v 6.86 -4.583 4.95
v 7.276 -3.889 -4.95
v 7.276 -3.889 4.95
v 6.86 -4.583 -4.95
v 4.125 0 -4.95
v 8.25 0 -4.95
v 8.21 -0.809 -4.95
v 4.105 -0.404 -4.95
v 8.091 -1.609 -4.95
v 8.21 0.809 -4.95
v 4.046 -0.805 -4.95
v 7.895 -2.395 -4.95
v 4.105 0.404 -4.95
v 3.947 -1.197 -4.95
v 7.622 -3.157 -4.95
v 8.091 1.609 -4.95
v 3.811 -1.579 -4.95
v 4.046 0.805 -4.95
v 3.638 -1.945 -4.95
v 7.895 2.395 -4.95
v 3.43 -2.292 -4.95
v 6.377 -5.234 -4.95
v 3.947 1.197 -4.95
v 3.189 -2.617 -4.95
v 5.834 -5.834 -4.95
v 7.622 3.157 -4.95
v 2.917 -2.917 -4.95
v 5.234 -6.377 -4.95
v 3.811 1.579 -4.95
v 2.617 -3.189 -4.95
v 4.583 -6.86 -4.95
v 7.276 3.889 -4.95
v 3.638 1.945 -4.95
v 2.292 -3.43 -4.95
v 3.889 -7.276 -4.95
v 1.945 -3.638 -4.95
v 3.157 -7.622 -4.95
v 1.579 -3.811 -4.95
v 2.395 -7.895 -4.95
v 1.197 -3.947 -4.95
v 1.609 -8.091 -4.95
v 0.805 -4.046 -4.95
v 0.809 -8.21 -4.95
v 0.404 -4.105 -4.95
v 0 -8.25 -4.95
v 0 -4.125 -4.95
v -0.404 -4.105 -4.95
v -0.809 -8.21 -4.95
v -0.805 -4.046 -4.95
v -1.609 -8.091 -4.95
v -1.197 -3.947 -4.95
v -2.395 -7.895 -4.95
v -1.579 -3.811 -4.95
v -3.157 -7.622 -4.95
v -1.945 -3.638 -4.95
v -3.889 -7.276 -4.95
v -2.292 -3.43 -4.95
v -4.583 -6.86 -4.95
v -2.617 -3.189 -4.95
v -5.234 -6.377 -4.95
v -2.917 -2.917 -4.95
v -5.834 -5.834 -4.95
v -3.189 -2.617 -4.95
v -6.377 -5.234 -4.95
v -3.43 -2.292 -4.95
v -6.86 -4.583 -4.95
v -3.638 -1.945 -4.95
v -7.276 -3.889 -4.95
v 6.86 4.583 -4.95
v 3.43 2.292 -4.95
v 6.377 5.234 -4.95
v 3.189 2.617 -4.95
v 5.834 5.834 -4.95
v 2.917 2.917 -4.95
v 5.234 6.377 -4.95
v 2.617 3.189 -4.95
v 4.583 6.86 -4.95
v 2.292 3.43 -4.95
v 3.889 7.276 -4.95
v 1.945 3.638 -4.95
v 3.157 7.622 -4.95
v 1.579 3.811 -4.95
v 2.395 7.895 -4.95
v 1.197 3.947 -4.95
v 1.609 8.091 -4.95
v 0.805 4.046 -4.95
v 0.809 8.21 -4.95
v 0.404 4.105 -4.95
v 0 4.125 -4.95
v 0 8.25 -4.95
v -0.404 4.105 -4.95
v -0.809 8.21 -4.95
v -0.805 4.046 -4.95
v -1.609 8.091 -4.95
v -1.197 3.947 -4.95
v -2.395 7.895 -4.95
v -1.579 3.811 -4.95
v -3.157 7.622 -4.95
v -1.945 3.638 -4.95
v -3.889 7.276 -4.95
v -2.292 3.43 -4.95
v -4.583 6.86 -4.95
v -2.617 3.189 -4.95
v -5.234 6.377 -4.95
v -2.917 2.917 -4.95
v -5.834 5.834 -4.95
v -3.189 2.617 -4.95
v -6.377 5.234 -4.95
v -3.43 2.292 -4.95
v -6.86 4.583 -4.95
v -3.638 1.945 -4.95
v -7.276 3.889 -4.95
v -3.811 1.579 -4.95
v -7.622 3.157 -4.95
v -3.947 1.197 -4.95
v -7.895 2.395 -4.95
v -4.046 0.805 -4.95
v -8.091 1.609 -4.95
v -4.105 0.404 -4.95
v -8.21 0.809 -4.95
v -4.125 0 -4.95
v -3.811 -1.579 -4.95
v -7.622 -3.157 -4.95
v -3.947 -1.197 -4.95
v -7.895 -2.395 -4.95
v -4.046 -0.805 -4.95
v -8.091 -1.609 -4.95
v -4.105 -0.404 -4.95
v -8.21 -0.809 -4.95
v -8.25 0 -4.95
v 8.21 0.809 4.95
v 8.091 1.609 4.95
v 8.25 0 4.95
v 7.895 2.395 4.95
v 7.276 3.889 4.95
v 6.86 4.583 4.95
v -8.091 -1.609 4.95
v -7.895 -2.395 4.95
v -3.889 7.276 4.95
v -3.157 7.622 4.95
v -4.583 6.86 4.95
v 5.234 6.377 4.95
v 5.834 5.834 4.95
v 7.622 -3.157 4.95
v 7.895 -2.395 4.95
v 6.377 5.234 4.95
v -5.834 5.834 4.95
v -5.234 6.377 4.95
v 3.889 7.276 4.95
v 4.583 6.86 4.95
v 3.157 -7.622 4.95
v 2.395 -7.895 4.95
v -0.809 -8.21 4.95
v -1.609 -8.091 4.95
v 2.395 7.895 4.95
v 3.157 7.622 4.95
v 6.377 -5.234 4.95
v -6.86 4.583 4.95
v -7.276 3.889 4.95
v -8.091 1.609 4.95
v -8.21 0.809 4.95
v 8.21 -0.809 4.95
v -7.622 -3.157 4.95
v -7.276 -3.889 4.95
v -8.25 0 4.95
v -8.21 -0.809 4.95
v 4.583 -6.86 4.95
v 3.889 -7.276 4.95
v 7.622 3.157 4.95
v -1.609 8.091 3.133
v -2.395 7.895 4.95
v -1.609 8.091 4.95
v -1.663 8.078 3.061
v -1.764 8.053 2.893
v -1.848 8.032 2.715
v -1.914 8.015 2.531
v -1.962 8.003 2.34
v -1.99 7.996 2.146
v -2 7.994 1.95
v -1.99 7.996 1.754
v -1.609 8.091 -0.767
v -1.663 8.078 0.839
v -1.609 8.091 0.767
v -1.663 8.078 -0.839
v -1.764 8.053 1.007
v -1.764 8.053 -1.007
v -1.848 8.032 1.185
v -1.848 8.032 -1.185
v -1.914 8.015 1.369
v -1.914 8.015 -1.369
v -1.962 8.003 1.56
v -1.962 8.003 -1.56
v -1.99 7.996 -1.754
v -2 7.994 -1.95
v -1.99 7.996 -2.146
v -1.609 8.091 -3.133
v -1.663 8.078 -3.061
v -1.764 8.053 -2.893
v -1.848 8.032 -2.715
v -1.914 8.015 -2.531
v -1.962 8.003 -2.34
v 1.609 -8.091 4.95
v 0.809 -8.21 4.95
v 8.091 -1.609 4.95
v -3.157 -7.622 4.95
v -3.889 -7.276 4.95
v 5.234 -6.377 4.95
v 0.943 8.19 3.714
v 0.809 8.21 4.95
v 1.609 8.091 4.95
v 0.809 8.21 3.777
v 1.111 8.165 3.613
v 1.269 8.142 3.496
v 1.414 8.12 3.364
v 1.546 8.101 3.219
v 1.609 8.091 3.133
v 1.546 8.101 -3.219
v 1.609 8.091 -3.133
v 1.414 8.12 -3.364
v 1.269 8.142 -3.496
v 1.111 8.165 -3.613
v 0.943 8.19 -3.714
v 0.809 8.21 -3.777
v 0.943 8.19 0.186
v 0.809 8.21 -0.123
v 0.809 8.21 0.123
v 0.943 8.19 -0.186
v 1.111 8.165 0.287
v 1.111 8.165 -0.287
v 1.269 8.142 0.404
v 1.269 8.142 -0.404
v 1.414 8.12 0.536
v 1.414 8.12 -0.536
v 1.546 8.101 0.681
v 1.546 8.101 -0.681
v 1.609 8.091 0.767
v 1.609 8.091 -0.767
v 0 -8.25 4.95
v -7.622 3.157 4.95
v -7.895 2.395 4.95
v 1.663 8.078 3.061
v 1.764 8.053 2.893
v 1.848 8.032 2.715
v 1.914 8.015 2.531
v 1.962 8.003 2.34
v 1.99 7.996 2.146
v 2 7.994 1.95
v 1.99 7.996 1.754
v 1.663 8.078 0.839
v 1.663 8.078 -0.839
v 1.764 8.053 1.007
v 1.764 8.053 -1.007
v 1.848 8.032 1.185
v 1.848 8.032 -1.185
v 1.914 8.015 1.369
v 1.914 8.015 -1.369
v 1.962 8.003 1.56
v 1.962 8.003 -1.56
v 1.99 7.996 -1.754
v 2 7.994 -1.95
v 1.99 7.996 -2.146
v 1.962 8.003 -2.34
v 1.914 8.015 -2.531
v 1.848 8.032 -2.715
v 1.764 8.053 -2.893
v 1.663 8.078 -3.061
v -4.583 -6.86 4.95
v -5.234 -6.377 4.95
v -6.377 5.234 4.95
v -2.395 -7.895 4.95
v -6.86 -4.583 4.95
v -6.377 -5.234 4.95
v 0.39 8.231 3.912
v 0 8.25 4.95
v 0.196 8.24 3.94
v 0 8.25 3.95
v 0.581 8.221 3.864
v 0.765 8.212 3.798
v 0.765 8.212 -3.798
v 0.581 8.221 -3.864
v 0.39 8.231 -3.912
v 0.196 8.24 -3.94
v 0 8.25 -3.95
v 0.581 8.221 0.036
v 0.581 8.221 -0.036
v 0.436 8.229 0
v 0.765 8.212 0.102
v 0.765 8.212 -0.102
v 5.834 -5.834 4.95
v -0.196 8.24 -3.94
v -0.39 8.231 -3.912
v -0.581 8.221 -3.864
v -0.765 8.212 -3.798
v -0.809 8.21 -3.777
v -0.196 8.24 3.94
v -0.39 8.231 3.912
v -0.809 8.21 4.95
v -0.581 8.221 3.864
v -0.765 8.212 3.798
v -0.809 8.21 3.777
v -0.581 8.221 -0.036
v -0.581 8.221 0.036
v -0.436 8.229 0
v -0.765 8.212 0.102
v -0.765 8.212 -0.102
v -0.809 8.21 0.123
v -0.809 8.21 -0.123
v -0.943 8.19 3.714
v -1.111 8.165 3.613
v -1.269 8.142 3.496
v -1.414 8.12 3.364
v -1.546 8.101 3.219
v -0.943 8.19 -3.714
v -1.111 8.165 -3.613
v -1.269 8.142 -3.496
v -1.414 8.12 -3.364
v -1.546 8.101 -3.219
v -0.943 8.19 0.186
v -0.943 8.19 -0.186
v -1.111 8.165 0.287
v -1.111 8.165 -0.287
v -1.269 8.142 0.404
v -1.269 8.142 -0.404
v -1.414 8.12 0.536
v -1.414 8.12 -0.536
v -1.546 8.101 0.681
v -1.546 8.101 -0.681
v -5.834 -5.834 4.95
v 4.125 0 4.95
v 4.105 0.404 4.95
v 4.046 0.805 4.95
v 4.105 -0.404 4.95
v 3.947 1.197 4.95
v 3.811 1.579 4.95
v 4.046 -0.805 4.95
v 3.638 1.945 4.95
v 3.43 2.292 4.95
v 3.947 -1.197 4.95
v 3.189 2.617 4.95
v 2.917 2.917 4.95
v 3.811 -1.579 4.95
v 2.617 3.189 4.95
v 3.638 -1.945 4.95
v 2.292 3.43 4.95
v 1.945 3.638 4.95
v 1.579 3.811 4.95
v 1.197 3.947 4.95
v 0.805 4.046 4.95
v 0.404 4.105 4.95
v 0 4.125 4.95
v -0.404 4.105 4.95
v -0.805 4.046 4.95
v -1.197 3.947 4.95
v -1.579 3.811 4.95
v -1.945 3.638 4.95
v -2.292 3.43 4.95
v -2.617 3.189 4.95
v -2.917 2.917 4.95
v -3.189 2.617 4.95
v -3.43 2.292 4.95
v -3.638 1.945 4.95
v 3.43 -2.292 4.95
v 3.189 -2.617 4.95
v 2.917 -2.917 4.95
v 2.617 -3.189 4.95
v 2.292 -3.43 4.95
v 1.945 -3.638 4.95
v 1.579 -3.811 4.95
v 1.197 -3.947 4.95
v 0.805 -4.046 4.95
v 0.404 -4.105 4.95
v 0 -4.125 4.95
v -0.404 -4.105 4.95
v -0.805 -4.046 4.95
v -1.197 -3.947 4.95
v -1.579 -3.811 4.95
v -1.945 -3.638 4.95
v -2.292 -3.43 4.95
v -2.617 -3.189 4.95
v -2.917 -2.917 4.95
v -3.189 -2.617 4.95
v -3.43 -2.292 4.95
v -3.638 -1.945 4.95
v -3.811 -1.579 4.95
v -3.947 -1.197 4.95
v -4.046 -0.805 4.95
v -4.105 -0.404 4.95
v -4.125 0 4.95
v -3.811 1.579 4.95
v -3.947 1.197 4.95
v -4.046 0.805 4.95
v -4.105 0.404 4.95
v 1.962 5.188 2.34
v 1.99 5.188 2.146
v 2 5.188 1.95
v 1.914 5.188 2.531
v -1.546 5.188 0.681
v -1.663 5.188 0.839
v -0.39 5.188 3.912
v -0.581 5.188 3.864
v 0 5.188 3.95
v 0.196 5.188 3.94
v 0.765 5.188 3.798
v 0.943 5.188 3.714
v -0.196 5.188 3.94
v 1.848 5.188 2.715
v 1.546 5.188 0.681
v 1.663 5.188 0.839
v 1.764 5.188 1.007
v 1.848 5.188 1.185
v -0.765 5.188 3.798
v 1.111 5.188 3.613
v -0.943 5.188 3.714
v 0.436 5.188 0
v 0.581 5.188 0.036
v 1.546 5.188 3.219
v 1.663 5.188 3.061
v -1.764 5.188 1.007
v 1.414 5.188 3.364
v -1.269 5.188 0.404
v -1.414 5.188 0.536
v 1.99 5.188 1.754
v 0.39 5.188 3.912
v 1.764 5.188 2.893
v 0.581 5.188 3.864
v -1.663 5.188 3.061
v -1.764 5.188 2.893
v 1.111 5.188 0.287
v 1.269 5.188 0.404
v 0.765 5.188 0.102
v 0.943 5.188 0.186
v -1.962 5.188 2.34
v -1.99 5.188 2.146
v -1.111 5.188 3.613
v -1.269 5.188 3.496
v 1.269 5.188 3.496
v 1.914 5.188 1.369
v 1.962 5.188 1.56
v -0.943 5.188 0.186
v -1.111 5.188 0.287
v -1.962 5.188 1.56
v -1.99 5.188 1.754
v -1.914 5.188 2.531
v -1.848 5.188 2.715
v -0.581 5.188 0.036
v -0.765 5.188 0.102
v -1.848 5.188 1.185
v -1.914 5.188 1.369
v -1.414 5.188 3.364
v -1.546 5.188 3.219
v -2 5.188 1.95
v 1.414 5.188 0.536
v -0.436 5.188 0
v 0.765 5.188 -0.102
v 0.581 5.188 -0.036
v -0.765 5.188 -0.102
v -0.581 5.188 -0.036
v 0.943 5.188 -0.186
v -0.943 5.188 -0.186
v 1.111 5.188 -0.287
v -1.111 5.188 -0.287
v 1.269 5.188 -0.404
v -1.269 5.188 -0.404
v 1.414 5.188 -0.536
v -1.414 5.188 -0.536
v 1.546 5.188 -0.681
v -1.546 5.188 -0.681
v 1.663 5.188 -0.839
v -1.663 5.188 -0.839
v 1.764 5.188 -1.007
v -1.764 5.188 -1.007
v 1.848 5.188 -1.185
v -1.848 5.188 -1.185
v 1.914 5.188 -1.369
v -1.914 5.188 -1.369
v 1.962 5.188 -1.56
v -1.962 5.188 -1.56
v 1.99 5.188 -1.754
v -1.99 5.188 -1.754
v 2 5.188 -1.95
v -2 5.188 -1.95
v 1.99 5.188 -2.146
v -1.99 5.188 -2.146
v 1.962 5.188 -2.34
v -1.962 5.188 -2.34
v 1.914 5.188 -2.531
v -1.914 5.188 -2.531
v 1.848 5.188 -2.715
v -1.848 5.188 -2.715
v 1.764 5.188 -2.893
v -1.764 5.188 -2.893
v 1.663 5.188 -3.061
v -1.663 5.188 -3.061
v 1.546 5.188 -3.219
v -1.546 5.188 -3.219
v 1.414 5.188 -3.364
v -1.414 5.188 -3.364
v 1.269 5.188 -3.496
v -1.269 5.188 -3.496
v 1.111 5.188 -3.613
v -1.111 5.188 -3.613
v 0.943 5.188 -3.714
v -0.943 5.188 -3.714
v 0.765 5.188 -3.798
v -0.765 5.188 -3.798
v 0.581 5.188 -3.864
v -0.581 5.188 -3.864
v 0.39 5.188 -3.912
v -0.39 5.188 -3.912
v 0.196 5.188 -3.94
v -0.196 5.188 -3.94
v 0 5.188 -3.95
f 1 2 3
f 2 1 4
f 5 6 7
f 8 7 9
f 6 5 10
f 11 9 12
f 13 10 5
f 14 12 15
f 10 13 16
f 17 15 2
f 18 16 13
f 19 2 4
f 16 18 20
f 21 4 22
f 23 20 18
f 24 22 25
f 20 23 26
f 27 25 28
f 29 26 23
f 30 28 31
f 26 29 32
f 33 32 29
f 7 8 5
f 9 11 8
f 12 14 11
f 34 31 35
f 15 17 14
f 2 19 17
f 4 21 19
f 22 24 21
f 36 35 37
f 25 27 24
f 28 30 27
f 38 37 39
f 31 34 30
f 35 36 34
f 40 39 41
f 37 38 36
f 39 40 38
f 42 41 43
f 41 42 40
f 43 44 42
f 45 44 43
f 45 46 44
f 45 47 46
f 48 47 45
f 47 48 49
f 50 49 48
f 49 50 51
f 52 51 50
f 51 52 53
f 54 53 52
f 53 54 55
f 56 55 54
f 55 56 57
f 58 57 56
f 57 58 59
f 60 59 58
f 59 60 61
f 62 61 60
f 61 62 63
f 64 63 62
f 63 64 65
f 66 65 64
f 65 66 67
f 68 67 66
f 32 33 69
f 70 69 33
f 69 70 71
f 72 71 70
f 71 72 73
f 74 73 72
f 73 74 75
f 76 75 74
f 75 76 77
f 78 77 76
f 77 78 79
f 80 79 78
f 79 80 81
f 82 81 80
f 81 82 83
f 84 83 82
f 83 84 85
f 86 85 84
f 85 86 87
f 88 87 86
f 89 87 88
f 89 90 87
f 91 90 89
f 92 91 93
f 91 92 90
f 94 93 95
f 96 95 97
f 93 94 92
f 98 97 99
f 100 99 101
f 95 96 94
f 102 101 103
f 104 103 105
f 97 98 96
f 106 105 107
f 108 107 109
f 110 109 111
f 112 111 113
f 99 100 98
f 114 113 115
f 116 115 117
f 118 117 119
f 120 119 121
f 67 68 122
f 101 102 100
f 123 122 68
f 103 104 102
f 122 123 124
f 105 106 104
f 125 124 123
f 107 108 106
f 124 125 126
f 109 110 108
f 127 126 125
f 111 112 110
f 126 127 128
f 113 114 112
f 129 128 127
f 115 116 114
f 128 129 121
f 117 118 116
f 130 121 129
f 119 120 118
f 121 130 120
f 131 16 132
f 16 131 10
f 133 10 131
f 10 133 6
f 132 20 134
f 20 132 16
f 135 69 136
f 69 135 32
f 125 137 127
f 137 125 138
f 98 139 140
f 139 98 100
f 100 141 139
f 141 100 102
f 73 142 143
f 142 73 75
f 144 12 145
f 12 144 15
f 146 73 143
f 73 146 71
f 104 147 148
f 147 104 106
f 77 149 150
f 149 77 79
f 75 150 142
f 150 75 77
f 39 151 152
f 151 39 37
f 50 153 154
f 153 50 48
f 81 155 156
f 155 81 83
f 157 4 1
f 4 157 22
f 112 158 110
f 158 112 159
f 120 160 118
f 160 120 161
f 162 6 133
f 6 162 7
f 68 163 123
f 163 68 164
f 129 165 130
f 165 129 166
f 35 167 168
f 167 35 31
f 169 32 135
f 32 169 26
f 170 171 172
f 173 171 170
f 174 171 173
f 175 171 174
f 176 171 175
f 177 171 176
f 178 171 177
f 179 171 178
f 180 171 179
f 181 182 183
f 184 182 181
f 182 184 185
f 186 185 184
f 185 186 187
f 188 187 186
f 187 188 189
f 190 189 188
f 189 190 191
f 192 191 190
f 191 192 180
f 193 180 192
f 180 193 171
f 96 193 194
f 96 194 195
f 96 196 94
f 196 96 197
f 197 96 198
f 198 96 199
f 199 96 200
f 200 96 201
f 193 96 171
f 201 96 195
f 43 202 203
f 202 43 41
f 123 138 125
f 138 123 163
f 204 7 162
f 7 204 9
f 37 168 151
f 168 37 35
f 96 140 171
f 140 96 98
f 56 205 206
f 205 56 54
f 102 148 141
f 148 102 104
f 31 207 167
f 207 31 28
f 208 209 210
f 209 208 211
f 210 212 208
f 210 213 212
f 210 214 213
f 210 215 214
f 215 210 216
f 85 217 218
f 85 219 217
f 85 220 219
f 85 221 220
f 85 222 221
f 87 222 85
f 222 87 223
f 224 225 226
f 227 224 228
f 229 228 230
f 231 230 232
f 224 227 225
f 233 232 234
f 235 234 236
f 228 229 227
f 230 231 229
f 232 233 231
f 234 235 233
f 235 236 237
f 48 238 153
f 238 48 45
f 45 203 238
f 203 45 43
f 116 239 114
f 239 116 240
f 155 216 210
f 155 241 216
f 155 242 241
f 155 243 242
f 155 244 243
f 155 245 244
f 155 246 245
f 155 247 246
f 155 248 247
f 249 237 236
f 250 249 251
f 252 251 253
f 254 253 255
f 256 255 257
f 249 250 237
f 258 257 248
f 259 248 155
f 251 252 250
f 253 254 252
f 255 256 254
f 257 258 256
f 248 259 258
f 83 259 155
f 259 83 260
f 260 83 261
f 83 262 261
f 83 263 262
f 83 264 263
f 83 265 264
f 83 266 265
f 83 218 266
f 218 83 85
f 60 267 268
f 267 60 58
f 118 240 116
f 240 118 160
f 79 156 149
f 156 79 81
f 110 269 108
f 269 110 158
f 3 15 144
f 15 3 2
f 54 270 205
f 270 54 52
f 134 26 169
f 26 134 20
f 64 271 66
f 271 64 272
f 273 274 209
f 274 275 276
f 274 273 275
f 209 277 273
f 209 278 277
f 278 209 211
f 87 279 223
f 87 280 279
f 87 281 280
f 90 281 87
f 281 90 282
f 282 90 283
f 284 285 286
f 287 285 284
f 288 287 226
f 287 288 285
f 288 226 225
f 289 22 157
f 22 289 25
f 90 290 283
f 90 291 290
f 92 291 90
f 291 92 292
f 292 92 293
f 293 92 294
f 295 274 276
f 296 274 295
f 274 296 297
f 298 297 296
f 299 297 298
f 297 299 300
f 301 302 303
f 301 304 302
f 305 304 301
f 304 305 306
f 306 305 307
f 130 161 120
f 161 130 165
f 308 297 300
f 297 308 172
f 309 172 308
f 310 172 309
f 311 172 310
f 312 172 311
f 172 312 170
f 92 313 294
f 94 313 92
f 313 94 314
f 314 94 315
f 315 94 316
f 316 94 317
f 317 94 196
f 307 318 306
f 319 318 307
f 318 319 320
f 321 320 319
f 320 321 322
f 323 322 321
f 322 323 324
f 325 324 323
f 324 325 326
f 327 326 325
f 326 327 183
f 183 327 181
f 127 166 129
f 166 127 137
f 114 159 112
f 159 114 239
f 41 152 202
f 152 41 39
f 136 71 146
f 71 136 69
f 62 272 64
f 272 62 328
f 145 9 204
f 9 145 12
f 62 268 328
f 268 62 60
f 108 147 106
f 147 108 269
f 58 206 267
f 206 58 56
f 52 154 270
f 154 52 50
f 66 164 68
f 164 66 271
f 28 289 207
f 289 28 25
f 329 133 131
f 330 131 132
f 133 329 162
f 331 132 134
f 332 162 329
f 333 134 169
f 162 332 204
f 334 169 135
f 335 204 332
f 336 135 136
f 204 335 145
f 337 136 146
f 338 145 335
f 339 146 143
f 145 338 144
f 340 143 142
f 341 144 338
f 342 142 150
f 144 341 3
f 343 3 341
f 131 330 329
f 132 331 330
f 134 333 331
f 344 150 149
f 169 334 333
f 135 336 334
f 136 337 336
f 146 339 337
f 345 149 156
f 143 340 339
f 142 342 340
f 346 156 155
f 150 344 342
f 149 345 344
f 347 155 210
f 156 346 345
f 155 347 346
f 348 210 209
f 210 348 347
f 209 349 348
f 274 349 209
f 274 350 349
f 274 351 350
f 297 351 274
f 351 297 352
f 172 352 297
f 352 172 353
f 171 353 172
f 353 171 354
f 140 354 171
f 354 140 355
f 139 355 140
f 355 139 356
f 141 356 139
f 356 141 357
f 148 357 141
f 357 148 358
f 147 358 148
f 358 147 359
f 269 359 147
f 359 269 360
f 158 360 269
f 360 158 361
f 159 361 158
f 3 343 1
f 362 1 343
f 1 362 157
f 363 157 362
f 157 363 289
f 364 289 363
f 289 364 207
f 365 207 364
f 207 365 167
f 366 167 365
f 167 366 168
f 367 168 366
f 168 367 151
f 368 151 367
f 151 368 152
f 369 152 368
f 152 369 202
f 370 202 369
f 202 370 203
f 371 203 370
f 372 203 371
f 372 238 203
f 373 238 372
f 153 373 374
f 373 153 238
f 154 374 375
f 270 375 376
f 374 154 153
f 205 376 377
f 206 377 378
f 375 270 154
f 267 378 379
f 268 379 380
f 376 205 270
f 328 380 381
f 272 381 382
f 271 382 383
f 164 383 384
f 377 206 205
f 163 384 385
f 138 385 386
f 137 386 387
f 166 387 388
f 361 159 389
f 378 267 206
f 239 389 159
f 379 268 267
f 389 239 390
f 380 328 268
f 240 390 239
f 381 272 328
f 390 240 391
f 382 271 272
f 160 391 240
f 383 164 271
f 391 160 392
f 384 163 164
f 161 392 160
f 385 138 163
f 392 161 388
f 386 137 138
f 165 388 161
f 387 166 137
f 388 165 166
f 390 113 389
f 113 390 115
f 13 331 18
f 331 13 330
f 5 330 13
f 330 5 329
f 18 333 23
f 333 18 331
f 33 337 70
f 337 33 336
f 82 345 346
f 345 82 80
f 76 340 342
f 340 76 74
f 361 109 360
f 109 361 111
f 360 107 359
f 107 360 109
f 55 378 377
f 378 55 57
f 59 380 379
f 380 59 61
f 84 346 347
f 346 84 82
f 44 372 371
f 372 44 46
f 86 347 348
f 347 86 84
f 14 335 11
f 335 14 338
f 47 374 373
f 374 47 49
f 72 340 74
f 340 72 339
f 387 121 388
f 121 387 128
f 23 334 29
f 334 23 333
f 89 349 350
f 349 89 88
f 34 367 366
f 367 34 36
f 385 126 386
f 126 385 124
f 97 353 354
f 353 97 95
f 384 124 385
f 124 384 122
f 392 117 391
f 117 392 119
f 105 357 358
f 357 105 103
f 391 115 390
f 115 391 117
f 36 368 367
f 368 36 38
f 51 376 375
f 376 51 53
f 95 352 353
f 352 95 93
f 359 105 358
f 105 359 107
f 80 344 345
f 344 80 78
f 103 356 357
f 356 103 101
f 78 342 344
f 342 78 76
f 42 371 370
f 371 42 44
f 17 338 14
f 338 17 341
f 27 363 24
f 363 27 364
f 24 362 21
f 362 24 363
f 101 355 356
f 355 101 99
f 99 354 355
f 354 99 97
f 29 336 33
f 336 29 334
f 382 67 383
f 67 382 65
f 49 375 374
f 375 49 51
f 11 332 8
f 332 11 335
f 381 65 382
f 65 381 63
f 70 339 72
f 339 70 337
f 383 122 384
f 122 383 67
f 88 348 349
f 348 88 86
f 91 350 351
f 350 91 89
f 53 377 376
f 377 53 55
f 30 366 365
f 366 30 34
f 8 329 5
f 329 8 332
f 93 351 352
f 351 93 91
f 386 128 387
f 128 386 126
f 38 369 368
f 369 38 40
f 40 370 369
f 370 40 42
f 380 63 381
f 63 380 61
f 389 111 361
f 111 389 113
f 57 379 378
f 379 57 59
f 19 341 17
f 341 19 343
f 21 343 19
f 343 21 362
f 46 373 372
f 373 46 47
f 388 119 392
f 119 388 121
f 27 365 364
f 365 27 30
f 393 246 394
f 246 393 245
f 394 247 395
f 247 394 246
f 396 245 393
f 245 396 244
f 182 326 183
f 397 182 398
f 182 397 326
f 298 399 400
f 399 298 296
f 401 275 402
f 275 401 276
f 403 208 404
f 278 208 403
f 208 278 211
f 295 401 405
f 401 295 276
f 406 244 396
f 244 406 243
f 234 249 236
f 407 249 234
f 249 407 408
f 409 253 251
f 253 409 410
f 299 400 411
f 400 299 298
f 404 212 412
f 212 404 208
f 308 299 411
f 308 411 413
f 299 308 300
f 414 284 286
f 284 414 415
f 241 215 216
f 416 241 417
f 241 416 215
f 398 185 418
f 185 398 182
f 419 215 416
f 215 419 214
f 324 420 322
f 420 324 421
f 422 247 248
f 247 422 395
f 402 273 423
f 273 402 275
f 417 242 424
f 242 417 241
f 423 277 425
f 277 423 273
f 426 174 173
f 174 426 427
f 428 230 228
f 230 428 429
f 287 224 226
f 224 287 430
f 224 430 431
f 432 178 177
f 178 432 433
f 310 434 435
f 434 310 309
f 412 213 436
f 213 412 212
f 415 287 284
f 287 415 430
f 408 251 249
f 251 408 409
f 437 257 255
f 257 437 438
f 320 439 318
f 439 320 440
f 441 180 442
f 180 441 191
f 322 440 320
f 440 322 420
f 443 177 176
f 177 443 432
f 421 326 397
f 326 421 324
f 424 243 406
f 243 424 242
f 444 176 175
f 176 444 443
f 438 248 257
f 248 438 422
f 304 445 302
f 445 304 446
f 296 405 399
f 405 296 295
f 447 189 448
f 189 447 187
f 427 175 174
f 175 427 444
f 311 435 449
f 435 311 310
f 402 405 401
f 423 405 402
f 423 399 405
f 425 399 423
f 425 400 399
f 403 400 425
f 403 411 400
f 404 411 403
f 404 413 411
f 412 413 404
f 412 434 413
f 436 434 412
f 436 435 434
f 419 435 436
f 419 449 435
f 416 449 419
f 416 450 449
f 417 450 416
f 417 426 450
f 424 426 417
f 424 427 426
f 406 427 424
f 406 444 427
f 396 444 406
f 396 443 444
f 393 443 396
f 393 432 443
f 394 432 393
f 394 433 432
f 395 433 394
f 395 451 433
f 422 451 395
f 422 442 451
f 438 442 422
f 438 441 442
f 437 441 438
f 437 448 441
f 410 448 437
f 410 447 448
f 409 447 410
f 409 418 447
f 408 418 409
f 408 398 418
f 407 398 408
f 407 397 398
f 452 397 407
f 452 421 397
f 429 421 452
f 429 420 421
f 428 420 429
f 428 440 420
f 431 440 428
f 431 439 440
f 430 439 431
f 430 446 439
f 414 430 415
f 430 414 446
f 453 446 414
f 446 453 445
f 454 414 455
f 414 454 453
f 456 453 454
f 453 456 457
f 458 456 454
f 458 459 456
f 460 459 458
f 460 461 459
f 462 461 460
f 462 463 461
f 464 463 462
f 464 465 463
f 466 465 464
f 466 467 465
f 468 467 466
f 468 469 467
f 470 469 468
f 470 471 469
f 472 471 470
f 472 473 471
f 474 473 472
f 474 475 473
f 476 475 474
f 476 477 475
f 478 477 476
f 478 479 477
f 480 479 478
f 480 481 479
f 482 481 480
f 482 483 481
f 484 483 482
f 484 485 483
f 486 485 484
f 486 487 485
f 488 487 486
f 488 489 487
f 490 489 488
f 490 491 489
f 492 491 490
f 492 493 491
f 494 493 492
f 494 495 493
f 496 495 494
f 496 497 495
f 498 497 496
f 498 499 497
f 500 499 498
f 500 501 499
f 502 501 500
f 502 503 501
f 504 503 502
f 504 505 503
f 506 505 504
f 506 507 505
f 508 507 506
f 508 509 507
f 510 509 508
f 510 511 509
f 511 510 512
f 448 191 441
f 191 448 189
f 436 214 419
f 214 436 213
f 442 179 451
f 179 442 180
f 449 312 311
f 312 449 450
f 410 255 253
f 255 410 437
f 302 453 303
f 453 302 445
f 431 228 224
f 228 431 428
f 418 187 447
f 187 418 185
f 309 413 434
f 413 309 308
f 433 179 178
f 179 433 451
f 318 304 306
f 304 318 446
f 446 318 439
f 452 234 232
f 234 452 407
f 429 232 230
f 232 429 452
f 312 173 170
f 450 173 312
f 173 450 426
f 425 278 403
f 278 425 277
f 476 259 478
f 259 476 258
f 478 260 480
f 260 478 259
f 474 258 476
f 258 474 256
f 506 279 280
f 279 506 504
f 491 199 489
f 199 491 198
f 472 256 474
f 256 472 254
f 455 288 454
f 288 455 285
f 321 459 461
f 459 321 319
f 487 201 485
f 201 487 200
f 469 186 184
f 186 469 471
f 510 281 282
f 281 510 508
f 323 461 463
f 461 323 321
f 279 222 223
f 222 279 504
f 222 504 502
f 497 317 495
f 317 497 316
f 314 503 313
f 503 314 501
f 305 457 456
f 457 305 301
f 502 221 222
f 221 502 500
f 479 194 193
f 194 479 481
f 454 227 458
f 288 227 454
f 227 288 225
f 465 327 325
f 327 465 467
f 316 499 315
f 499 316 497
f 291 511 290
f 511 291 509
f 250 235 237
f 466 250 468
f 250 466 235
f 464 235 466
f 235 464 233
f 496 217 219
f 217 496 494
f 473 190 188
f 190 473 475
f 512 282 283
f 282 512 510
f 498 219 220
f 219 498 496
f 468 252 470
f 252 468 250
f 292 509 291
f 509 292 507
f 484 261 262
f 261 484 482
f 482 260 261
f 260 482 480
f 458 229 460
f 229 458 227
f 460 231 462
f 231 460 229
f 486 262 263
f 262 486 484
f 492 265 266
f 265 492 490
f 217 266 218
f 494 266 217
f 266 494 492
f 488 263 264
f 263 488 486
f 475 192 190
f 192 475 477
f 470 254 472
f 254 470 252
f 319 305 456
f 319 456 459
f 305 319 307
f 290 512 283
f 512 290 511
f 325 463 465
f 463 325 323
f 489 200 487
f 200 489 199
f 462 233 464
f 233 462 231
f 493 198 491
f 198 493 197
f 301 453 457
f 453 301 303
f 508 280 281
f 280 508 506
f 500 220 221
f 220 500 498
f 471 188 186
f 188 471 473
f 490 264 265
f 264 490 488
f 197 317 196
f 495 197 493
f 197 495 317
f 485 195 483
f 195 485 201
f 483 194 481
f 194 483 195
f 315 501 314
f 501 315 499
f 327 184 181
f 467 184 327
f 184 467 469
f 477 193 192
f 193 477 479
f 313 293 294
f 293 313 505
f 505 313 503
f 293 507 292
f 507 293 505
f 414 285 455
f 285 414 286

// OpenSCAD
// COBRA Vertebra - S1 V24
// Height: 9.9mm, OD: 16.5mm

$fn = 64;

difference() {
    // Outer cylinder
    cylinder(h=9.9, d=16.5, center=true);
    
    // Inner channel
    cylinder(h=11.9, d=8.25, center=true);

    // Pivot holes
    translate([0, 8.25, 1.9500000000000002])
    rotate([90, 0, 0])
    cylinder(h=6.125, d=4, center=true);
    
    translate([0, 8.25, -1.9500000000000002])
    rotate([90, 0, 0])
    cylinder(h=6.125, d=4, center=true);
}
